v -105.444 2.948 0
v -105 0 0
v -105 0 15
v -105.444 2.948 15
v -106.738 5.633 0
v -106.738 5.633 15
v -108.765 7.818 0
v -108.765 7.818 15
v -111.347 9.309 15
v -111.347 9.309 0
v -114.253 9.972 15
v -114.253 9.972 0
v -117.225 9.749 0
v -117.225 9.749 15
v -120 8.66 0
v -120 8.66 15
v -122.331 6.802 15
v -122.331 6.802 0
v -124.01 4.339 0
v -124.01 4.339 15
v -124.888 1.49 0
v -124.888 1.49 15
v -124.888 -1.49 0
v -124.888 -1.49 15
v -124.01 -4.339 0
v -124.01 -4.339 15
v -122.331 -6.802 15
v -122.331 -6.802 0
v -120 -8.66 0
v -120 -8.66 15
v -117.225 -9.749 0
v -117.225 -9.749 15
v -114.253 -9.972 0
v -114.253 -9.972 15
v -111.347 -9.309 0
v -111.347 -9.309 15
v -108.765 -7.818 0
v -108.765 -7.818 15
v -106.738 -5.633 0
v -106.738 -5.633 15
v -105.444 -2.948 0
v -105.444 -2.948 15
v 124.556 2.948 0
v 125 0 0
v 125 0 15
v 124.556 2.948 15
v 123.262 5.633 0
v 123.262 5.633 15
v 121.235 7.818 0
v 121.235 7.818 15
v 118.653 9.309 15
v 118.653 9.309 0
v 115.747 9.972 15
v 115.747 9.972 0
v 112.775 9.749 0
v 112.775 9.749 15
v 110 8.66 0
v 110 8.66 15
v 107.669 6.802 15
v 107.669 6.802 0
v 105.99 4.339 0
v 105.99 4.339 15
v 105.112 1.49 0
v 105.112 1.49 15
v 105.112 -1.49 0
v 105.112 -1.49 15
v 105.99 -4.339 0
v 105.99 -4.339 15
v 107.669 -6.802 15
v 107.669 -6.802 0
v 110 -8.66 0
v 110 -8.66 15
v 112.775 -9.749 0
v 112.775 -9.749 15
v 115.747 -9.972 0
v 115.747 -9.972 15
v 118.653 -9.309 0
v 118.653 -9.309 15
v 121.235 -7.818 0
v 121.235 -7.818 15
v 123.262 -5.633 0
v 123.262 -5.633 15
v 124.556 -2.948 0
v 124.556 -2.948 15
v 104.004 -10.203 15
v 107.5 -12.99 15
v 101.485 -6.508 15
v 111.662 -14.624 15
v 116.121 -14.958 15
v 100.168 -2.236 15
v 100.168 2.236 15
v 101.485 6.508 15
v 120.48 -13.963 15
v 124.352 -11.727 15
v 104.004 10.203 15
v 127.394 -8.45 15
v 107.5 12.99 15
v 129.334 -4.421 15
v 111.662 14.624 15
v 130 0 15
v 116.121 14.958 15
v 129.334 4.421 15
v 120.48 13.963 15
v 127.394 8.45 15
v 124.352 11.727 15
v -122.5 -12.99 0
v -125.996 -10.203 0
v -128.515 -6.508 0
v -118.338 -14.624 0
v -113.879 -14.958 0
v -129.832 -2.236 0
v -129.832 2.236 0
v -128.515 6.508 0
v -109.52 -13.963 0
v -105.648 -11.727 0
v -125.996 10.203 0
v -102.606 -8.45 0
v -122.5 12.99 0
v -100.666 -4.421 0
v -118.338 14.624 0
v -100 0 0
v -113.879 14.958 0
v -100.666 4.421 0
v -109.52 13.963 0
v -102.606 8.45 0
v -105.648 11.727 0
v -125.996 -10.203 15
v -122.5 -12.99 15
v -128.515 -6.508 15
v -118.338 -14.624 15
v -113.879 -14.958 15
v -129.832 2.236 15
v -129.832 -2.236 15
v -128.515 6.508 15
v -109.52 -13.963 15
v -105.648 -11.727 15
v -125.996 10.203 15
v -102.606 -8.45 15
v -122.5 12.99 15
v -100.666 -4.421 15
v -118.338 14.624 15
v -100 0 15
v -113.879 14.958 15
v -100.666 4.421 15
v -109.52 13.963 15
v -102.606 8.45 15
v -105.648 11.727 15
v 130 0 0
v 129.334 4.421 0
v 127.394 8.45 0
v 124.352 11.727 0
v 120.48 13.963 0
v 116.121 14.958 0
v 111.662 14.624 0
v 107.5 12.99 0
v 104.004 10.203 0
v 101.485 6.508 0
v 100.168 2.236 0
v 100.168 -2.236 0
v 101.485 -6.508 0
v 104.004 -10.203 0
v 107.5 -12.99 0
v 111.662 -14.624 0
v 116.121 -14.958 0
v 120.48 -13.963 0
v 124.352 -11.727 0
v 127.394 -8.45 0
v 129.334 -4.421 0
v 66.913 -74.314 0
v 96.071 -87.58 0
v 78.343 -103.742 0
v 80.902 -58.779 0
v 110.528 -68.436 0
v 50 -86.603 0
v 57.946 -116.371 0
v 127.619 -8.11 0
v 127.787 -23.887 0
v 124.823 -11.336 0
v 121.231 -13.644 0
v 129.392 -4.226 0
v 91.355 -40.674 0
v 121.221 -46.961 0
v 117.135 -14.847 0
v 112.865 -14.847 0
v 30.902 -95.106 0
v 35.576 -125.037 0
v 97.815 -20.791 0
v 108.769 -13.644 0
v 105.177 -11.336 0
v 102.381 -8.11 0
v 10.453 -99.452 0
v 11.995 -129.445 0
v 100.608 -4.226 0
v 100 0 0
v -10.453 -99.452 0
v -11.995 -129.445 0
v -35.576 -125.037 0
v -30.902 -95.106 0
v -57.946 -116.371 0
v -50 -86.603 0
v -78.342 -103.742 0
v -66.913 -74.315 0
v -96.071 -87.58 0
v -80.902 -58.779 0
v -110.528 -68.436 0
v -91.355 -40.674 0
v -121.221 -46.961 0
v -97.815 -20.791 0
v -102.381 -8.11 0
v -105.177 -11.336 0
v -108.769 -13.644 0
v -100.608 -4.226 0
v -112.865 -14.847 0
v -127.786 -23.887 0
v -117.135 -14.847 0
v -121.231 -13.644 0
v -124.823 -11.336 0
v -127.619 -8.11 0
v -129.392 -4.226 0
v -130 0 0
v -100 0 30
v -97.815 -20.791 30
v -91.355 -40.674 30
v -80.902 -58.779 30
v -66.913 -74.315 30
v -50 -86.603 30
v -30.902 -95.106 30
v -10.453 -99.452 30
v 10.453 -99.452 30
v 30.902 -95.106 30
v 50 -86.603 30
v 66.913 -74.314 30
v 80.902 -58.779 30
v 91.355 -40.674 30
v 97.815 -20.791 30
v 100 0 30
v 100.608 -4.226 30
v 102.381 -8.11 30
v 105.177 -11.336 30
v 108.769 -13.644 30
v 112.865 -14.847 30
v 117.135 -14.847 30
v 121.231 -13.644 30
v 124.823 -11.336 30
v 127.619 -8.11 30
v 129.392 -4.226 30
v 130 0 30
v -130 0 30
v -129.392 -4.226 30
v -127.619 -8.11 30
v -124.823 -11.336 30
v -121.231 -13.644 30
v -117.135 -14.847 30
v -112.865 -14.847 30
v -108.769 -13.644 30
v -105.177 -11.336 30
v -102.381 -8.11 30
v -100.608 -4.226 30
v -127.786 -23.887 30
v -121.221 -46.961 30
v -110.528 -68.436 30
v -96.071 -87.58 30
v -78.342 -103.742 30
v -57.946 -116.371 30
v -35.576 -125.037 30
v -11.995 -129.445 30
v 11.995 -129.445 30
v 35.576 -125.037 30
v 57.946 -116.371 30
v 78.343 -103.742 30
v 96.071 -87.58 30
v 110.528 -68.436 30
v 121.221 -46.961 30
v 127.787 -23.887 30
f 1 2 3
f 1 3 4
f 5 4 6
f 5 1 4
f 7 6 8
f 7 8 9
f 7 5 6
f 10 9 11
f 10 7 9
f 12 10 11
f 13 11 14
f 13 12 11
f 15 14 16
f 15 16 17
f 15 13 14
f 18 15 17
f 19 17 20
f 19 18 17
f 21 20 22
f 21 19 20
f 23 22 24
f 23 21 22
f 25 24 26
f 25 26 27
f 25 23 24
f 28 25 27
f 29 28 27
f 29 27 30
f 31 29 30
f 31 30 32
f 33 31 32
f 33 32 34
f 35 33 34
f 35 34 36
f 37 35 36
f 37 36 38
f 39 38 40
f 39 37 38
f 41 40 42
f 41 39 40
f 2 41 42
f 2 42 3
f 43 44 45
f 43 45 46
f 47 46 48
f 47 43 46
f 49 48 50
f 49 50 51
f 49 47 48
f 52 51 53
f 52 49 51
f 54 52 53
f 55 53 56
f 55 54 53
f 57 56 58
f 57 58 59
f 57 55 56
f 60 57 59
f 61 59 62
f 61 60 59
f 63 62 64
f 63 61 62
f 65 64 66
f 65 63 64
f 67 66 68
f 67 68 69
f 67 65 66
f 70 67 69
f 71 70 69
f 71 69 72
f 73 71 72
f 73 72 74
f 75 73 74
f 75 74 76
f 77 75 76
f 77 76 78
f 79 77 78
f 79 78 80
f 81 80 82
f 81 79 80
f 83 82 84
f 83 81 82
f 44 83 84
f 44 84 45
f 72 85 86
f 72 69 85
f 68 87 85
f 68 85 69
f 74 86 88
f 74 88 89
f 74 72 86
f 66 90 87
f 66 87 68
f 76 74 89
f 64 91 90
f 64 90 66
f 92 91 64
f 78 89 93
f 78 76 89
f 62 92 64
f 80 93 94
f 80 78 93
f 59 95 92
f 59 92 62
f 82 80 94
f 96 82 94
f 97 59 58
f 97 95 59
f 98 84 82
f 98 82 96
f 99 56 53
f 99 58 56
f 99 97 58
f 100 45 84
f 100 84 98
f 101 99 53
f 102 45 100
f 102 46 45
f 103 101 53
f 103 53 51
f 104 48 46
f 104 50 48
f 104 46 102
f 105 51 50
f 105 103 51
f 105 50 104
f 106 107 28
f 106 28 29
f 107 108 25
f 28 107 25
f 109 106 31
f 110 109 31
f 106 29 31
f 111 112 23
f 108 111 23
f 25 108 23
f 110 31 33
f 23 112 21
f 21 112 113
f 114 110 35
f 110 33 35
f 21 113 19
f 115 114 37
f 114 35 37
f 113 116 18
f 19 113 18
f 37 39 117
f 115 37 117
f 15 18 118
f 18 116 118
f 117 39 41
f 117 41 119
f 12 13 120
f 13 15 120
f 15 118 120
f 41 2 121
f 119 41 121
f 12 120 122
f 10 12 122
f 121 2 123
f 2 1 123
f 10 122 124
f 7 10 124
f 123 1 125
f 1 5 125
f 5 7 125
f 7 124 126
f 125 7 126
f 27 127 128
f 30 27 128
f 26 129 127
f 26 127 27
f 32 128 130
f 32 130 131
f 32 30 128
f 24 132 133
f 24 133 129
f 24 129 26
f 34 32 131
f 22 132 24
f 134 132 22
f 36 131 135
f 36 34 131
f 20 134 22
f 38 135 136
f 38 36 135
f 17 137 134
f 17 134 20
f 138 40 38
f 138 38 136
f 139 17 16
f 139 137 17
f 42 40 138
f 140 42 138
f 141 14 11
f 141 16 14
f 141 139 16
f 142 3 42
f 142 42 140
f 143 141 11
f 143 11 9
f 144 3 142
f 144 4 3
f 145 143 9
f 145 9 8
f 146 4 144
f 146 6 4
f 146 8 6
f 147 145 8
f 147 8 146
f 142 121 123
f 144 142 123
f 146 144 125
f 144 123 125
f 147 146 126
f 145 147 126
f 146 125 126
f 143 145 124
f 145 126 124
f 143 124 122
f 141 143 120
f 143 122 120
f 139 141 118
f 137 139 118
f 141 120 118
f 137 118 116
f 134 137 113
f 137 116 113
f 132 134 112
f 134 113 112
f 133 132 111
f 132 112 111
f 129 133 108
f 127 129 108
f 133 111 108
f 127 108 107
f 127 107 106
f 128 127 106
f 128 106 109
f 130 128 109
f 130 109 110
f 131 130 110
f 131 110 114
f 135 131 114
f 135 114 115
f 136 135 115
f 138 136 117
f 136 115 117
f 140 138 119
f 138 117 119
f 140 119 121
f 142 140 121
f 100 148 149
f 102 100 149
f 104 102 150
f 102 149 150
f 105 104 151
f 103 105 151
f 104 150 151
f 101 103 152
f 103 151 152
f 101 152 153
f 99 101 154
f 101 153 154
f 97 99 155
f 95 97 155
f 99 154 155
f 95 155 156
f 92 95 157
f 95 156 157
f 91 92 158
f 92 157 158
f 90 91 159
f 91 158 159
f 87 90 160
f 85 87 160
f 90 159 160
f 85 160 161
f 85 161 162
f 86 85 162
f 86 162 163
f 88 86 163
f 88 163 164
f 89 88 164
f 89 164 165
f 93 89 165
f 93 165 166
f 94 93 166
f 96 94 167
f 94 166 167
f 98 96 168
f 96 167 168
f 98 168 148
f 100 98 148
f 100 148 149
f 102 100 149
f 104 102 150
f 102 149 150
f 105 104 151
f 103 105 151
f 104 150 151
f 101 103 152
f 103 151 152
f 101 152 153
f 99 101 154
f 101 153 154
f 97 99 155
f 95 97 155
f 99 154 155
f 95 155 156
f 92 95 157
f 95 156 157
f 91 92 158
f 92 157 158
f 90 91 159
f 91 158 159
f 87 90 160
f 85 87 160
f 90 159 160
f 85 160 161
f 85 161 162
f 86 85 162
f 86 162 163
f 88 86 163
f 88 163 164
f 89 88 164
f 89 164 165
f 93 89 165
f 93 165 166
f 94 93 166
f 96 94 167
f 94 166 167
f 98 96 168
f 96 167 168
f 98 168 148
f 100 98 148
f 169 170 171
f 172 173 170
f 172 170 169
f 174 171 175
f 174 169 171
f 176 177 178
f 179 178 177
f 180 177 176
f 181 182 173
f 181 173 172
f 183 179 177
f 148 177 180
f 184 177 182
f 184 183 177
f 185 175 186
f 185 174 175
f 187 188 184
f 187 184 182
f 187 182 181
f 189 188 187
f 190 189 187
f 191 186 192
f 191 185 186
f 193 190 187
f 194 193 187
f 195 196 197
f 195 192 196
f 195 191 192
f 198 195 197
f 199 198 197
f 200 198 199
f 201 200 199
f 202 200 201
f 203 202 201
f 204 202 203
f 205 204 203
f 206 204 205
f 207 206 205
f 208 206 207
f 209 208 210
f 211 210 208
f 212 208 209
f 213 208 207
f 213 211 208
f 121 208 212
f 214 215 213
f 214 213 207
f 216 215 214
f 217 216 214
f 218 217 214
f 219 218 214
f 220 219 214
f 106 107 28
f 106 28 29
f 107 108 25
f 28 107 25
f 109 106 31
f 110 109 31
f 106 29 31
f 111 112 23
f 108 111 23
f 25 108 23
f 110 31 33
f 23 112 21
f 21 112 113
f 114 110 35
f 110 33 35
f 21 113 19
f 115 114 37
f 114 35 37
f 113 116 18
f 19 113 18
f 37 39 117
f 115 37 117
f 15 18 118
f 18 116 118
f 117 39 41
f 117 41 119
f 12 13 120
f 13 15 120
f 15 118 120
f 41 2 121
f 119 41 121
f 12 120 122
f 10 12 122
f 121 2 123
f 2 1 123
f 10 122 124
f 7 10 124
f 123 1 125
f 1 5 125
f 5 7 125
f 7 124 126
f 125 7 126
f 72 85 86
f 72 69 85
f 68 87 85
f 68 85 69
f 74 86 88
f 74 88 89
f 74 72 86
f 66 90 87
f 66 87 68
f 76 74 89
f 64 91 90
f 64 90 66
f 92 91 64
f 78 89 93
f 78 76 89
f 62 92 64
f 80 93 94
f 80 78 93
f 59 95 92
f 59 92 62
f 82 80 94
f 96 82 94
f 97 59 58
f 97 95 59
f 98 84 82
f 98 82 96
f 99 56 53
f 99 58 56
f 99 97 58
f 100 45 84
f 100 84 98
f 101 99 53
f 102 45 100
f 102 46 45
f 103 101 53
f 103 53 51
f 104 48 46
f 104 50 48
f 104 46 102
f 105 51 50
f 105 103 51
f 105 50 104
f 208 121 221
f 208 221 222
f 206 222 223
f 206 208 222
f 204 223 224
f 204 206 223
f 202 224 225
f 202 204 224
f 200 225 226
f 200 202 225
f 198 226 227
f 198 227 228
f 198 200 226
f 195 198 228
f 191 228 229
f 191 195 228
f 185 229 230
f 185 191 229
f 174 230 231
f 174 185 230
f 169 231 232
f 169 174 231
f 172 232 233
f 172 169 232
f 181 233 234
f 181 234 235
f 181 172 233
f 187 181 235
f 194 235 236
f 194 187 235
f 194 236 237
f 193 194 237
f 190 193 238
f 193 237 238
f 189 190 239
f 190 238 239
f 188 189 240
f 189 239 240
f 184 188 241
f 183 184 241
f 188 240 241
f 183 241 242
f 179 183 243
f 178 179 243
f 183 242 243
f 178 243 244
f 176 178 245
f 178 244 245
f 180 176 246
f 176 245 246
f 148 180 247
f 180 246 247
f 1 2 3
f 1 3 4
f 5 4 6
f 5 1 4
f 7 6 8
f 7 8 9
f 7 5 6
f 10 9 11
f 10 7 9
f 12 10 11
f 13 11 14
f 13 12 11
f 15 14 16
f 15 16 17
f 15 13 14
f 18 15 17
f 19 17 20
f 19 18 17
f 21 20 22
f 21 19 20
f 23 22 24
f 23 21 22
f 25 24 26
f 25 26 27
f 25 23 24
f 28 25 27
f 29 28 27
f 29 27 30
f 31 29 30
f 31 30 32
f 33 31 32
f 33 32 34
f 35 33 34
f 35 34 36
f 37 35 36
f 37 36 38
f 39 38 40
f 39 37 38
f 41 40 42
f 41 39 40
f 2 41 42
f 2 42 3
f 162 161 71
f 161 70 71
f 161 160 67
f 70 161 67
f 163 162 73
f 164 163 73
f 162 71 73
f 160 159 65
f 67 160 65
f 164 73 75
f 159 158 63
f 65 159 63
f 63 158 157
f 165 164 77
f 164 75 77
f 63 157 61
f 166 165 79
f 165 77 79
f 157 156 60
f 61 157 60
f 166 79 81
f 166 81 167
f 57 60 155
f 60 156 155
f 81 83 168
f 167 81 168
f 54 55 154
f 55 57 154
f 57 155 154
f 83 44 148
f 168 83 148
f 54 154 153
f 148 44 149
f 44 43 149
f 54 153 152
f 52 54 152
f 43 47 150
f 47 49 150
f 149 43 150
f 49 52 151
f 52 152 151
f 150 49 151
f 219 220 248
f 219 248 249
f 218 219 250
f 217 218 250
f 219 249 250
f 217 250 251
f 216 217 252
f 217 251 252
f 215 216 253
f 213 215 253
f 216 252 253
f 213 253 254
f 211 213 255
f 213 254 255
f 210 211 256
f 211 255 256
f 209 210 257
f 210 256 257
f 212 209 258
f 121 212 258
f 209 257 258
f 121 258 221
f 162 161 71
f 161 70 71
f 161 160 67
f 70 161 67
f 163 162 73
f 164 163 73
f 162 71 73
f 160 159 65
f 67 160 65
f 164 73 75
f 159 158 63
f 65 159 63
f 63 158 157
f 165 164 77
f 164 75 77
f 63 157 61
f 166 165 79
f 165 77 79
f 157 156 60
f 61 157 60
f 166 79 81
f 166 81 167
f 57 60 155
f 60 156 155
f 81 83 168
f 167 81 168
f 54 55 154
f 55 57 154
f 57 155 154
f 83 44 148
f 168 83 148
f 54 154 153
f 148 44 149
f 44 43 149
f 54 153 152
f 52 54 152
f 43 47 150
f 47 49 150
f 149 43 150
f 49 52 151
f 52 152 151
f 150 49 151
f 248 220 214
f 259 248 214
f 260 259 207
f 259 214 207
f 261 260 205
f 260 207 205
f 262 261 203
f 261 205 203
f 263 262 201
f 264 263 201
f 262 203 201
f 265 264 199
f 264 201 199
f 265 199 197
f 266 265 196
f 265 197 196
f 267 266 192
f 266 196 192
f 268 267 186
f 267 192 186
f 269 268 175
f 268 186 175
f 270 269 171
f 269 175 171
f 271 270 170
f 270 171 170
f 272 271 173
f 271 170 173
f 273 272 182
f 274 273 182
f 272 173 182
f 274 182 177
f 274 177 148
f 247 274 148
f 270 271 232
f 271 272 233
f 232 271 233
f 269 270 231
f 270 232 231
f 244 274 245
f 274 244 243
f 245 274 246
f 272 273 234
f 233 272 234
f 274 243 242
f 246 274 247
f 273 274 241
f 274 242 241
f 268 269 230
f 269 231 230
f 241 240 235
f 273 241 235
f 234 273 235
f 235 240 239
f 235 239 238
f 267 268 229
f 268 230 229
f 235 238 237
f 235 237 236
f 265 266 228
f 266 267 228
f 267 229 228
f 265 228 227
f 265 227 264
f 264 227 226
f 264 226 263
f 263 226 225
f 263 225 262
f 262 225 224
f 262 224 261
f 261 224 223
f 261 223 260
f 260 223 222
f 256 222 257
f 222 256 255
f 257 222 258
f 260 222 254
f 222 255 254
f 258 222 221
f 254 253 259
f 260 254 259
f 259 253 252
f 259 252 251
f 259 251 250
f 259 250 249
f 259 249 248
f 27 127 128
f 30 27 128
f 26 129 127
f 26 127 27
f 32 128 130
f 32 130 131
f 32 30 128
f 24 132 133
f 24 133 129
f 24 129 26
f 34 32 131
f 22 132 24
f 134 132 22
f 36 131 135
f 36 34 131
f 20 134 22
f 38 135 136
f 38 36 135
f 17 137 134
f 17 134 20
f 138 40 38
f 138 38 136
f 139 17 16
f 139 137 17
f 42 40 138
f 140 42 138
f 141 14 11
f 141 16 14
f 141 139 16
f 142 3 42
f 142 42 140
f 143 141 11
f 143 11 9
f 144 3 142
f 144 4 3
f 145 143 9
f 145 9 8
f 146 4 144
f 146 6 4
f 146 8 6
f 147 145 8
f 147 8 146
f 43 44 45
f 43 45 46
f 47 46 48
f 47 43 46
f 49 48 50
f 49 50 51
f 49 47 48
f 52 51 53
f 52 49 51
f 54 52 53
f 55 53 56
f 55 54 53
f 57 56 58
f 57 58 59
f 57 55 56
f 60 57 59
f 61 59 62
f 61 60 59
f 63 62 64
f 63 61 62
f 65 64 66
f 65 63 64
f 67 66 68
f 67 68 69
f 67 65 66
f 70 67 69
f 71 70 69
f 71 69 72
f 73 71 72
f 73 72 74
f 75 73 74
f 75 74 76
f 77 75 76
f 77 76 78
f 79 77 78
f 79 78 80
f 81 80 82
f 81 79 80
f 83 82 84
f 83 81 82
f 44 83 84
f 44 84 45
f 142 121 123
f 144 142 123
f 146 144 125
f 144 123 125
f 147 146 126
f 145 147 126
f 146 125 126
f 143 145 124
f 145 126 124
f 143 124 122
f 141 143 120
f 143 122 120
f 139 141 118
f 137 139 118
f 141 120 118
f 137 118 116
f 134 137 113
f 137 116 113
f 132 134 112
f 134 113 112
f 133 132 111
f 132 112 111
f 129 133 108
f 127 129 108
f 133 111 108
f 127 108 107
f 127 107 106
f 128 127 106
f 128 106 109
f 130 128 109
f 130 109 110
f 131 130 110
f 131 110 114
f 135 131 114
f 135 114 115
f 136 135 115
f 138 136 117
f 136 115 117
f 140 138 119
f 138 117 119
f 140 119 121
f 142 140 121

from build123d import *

# Parameters (mm, degrees)
SKETCH001_R   = 15
SKETCH001_R_2 = 10
PAD001_DEPTH  = 15
PAD_DEPTH     = 30
POCKET_DEPTH  = 30
SKETCH003_R   = 15
SKETCH003_R_2 = 10
PAD002_DEPTH  = 15


with BuildPart() as pad001:
    # Sketch001 → Pad001 (new body)
    with BuildSketch(Plane.XY):
        with Locations((-115, 0)):
            Circle(SKETCH001_R)
        with Locations((-115, 0)):
            Circle(SKETCH001_R_2, mode=Mode.SUBTRACT)
        with Locations((115, 0)):
            Circle(SKETCH001_R)
        with Locations((115, 0)):
            Circle(SKETCH001_R_2, mode=Mode.SUBTRACT)
    extrude(amount=PAD001_DEPTH)


with BuildPart() as pocket:
    # Sketch → Pad (new body)
    with BuildSketch(Plane.XY):
        with BuildLine():
            ThreePointArc((-100, -4.2e-05), (2.1e-05, -100), (100, 0))
            Line((100, 0), (130, 0))
            ThreePointArc((-130, -4.2e-05), (2.1e-05, -130), (130, 0))
            Line((-130, -4.2e-05), (-100, -4.2e-05))
        make_face()
    extrude(amount=PAD_DEPTH)

    # Sketch002 → Pocket (cut)
    with BuildSketch(Plane.XY.offset(30)):
        with BuildLine():
            ThreePointArc((-130, 0), (-115, -15), (-100, 0))
            Line((-100, 0), (-130, 0))
        make_face()
        with BuildLine():
            ThreePointArc((100, 0), (115, -15), (130, 0))
            Line((100, 0), (130, 0))
        make_face()
    extrude(amount=-POCKET_DEPTH, mode=Mode.SUBTRACT)


with BuildPart() as pad002:
    # Sketch003 → Pad002 (new body)
    with BuildSketch(Plane.XY):
        with Locations((-115, 0)):
            Circle(SKETCH003_R)
        with Locations((-115, 0)):
            Circle(SKETCH003_R_2, mode=Mode.SUBTRACT)
        with Locations((115, 0)):
            Circle(SKETCH003_R)
        with Locations((115, 0)):
            Circle(SKETCH003_R_2, mode=Mode.SUBTRACT)
    extrude(amount=PAD002_DEPTH)


solid = Compound([pad001.part, pocket.part, pad002.part])
